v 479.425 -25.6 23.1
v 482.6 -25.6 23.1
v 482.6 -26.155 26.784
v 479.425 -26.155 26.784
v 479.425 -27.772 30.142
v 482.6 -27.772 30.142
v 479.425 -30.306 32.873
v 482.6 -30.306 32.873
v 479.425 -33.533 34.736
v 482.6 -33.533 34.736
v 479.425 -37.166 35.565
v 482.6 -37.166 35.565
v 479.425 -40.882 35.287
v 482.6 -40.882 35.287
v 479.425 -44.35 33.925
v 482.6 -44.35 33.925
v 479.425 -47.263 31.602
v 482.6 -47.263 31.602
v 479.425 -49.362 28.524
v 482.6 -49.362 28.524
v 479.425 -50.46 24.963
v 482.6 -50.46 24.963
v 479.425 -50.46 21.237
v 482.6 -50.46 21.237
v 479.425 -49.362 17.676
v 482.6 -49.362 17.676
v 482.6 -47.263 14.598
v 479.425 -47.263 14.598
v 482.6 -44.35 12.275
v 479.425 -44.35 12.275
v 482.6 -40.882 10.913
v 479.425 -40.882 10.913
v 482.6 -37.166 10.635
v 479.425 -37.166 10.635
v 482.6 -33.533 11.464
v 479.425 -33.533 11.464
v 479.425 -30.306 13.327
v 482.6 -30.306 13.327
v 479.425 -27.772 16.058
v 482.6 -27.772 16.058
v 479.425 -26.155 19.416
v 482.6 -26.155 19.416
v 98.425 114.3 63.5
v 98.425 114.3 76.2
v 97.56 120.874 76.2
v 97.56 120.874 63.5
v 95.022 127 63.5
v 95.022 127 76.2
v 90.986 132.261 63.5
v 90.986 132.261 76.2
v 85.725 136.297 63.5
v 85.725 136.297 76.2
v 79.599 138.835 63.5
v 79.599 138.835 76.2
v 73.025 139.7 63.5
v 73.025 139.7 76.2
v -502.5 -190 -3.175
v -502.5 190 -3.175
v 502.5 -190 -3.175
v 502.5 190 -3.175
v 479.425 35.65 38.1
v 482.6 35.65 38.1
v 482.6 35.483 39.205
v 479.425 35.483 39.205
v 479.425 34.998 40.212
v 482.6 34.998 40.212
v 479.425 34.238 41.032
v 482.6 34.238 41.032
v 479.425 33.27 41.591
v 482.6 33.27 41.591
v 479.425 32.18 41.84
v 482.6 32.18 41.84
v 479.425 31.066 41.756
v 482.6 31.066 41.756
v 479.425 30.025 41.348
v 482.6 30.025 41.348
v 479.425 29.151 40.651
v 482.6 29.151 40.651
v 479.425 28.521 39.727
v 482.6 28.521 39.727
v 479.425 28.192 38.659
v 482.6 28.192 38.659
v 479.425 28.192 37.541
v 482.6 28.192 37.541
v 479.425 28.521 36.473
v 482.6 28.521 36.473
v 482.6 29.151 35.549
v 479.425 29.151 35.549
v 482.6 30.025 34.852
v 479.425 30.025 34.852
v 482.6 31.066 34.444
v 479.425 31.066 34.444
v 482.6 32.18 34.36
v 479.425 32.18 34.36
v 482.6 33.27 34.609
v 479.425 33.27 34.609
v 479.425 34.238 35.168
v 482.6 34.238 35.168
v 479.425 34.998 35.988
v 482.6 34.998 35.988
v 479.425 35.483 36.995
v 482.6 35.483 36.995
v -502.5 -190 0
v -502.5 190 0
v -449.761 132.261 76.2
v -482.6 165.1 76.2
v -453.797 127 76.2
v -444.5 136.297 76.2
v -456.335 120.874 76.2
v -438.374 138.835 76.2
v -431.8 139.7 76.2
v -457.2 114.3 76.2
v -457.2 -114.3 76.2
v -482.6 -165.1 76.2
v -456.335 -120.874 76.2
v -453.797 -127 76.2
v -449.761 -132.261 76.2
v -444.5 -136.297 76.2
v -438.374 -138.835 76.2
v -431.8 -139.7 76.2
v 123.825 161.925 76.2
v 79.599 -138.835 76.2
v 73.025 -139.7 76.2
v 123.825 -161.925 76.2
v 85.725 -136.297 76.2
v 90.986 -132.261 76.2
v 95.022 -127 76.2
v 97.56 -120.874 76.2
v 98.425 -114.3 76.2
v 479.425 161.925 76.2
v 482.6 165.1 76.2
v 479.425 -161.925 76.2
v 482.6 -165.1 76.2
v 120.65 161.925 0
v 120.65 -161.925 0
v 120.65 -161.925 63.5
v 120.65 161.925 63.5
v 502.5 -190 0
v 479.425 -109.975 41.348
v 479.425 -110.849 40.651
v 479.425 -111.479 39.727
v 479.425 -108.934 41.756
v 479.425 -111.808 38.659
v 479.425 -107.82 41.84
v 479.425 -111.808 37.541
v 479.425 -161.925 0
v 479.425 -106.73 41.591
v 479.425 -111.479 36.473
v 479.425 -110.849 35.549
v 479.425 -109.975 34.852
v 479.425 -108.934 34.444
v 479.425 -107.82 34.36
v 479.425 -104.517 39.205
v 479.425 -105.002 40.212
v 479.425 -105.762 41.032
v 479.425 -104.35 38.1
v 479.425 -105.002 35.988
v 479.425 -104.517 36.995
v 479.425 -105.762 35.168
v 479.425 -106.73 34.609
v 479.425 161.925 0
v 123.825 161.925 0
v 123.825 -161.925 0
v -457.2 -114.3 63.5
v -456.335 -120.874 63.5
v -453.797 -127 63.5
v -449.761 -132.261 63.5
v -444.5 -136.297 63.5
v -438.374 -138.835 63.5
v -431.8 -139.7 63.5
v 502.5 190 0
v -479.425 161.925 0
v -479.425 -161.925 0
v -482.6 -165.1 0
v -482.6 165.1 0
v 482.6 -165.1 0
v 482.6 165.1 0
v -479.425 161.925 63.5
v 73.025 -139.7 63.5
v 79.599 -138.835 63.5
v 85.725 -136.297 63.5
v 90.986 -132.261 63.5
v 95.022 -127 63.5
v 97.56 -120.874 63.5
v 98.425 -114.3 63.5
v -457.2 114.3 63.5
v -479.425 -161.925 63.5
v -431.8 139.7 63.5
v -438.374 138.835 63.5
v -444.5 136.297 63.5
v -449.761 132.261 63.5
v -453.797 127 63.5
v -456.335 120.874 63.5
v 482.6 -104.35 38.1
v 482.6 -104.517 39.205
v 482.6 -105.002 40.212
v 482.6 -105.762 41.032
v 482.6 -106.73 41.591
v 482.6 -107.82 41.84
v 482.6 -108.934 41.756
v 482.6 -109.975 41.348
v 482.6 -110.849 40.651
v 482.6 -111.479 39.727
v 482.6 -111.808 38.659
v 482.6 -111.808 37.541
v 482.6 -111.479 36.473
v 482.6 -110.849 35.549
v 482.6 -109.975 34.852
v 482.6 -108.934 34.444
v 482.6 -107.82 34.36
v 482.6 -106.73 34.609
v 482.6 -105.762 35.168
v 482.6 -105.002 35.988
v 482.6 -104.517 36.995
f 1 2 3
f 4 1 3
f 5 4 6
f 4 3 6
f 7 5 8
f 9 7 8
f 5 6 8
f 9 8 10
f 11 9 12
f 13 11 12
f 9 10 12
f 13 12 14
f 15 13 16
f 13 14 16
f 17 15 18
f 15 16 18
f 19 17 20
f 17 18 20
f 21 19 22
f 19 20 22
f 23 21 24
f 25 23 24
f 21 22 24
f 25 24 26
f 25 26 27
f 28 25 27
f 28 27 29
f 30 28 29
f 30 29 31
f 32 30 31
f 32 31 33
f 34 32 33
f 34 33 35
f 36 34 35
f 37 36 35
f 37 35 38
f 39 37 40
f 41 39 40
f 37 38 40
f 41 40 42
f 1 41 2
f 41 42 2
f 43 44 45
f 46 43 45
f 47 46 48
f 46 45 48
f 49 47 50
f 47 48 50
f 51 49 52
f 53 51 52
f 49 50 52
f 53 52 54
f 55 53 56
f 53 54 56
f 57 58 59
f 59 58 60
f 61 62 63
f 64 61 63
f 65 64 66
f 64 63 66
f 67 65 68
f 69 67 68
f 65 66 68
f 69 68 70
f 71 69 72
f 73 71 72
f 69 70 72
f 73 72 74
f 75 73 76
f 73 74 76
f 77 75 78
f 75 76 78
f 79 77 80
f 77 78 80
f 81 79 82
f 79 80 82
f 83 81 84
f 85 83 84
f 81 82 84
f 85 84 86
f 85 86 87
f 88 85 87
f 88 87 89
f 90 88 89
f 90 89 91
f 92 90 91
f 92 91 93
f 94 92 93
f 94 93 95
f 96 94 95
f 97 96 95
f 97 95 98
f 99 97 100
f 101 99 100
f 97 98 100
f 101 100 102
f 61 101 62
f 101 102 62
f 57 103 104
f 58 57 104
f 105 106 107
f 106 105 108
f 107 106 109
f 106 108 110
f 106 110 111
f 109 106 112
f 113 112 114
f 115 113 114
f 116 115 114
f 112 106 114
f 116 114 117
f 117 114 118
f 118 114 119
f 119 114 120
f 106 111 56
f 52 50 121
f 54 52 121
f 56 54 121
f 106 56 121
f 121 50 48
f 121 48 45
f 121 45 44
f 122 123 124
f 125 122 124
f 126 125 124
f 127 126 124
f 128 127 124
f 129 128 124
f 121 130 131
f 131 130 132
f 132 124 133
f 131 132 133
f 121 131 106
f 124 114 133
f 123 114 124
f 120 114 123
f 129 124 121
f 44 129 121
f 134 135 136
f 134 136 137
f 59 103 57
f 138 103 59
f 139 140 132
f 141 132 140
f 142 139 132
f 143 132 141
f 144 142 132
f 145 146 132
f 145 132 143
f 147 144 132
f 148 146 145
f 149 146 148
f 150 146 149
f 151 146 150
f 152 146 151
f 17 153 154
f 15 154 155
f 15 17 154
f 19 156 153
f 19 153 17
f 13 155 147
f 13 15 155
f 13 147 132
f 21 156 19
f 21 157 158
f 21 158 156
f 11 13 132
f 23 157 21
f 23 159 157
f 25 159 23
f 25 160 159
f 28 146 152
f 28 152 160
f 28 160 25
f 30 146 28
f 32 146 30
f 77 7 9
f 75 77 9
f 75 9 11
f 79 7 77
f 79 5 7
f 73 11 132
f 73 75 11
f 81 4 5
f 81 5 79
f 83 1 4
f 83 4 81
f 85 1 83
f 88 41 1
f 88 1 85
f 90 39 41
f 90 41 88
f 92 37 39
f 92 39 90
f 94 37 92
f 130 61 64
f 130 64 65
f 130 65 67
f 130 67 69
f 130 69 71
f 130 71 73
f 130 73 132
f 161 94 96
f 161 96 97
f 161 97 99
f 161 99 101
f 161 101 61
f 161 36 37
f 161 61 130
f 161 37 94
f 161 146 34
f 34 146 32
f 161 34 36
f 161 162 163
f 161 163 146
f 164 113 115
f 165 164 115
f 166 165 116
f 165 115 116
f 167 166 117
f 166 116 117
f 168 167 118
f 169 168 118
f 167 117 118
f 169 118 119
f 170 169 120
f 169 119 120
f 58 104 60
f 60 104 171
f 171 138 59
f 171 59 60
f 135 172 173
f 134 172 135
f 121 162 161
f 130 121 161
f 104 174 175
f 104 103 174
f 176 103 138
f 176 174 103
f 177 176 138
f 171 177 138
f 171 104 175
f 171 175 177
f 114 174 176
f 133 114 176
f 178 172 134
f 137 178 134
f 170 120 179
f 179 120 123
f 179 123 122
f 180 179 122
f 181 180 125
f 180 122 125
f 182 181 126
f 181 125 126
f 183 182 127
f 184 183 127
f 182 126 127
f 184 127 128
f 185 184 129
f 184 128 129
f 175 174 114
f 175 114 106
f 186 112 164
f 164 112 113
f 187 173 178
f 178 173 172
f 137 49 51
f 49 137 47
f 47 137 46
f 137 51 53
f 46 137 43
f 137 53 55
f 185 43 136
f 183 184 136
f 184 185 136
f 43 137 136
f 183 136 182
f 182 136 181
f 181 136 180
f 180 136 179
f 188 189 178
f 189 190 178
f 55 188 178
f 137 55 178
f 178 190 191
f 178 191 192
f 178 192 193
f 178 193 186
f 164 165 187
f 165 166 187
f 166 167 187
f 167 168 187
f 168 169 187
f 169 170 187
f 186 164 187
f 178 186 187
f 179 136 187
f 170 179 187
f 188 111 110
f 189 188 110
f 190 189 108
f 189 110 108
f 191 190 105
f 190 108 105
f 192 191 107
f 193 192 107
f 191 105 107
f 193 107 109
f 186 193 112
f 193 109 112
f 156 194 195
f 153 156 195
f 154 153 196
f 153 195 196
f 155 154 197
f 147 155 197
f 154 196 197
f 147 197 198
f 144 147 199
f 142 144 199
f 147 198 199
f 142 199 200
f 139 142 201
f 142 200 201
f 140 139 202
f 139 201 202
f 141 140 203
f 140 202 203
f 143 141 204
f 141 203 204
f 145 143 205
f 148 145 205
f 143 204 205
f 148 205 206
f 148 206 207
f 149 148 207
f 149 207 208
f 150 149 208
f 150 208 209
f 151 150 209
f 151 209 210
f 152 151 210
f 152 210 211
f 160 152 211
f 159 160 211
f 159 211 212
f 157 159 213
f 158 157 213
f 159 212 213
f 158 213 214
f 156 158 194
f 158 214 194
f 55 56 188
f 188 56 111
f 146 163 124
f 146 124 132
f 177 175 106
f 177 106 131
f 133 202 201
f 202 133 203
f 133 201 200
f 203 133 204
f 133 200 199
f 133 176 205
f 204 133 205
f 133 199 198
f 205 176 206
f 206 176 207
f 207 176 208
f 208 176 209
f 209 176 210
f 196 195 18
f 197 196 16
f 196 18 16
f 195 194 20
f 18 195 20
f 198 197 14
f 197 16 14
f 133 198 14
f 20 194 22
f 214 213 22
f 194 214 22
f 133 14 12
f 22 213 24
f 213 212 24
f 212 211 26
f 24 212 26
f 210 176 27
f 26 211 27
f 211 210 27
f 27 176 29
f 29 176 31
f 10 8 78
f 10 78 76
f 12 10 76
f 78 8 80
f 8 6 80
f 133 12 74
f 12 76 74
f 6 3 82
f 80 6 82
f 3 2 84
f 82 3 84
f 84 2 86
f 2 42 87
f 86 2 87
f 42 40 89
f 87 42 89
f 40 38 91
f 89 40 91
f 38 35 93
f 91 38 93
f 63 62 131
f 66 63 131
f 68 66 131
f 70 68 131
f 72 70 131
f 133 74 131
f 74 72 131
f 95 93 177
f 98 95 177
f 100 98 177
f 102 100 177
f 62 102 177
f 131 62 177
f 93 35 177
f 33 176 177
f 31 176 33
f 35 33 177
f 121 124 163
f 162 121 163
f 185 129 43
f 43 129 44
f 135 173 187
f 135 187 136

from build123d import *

# Parameters (mm, degrees)
F0_W        = 1005
F0_H        = 380
F1_DEPTH    = 3.175
F2_W        = 965.2
F2_H        = 330.2
F3_DEPTH    = 76.2
F4_T        = 3.175
F4_T3_DEPTH = 336.55
F4_T5_DEPTH = 971.55
F5_R        = 3.75
F5_R_2      = 12.5
F6_DEPTH    = 3.175
F7_W        = 3.175
F7_H        = 323.85
F8_DEPTH    = 63.5
F10_DEPTH   = 325
F12_DEPTH   = 12.7


# Not quite as in the source:
# - a shell that OpenCascade refuses in one call is made with other operations: the cavity is built on its own and cut out


with BuildPart() as f1:
    # F0 (on Top) → F1 (new body)
    with BuildSketch(Plane.XY):
        Rectangle(F0_W, F0_H)
    extrude(amount=-F1_DEPTH)

    # F2 (on face) → F3 (join)
    with BuildSketch(Plane.XY):
        Rectangle(F2_W, F2_H)
    extrude(amount=F3_DEPTH)

    # F4: shell of thickness 3.175, made by hand


with BuildPart() as f4_core1:
    # F4_t2: copy of F1
    add(f1.part)

    # the walls: a layer under each face that stays
    f4_faces = [f4_core1.faces().sort_by_distance(p)[0] for p in [
        (502.5, 0, -1.5875),
        (0, -190, -1.5875),
        (0, 190, -1.5875),
        (-469, -177.3333333333, 0),
        (0, 0, -3.175),
        (-502.5, 0, -1.5875),
        (482.6, 0, 38.1),
        (0, 165.1, 38.1),
        (-482.6, 0, 38.1),
        (0, -165.1, 38.1),
    ]]
    thicken(f4_faces, amount=-F4_T, mode=Mode.SUBTRACT)

    # F4_s4 → F4_t3 (cut)
    with BuildSketch(Plane.XZ.offset(-168.275)):
        Polygon((482.63175, 0.03175), (482.6, -3.175), (479.425, -3.175), (479.425, 0), align=None)
        Polygon((-482.63175, 0.03175), (-482.6, -3.175), (-479.425, -3.175), (-479.425, 0), align=None)
    extrude(amount=F4_T3_DEPTH, mode=Mode.SUBTRACT)

    # F4_s6 → F4_t5 (cut)
    with BuildSketch(Plane.YZ.offset(-485.775)):
        Polygon((165.13175, 0.03175), (165.1, -3.175), (161.925, -3.175), (161.925, 0), align=None)
        Polygon((-165.13175, 0.03175), (-165.1, -3.175), (-161.925, -3.175), (-161.925, 0), align=None)
    extrude(amount=F4_T5_DEPTH, mode=Mode.SUBTRACT)


with BuildPart() as f1_1:
    add(f1.part)

    # what is left inside the walls is the cavity
    f4_cavity = [f4_core1.part.solids().sort_by_distance(p)[0] for p in [
        (0, -53.975, 0.03175),
    ]]
    add(f4_cavity, mode=Mode.SUBTRACT)

    # F5 (on face) → F6 (cut)
    with BuildSketch(Plane.YZ.offset(482.6)):
        with Locations((-108.1, 38.1)):
            Circle(F5_R)
        with Locations((-38.1, 23.1)):
            Circle(F5_R_2)
        with Locations((31.9, 38.1)):
            Circle(F5_R)
    extrude(amount=-F6_DEPTH, mode=Mode.SUBTRACT)

    # F7 (on face) → F8 (join)
    with BuildSketch(Plane.XY):
        with Locations((122.2375, 0)):
            Rectangle(F7_W, F7_H)
    extrude(amount=F8_DEPTH)

    # F9 (on face) → F10 (join)
    with BuildSketch(Plane(origin=(0, -161.925, 0), x_dir=(-1, 0, 0), z_dir=(0, 1, 0))):
        Polygon((-123.825, 76.2), (-123.825, 63.5), (-120.65, 63.5), (479.425, 63.5), (479.425, 76.2), align=None)
    extrude(amount=F10_DEPTH)

    # F11 (on face) → F12 (cut)
    with BuildSketch(Plane.XY.offset(76.2)):
        with BuildLine():
            ThreePointArc((-457.2, -114.3), (-449.7605122421, -132.2605122421), (-431.8, -139.7))
            Line((-431.8, -139.7), (73.025, -139.7))
            ThreePointArc((73.025, -139.7), (90.9855122421, -132.2605122421), (98.425, -114.3))
            Line((98.425, -114.3), (98.425, 114.3))
            ThreePointArc((98.425, 114.3), (90.9855122421, 132.2605122421), (73.025, 139.7))
            Line((73.025, 139.7), (-431.8, 139.7))
            ThreePointArc((-431.8, 139.7), (-449.7605122421, 132.2605122421), (-457.2, 114.3))
            Line((-457.2, 114.3), (-457.2, -114.3))
        make_face()
    extrude(amount=-F12_DEPTH, mode=Mode.SUBTRACT)


solid = f1_1.part
